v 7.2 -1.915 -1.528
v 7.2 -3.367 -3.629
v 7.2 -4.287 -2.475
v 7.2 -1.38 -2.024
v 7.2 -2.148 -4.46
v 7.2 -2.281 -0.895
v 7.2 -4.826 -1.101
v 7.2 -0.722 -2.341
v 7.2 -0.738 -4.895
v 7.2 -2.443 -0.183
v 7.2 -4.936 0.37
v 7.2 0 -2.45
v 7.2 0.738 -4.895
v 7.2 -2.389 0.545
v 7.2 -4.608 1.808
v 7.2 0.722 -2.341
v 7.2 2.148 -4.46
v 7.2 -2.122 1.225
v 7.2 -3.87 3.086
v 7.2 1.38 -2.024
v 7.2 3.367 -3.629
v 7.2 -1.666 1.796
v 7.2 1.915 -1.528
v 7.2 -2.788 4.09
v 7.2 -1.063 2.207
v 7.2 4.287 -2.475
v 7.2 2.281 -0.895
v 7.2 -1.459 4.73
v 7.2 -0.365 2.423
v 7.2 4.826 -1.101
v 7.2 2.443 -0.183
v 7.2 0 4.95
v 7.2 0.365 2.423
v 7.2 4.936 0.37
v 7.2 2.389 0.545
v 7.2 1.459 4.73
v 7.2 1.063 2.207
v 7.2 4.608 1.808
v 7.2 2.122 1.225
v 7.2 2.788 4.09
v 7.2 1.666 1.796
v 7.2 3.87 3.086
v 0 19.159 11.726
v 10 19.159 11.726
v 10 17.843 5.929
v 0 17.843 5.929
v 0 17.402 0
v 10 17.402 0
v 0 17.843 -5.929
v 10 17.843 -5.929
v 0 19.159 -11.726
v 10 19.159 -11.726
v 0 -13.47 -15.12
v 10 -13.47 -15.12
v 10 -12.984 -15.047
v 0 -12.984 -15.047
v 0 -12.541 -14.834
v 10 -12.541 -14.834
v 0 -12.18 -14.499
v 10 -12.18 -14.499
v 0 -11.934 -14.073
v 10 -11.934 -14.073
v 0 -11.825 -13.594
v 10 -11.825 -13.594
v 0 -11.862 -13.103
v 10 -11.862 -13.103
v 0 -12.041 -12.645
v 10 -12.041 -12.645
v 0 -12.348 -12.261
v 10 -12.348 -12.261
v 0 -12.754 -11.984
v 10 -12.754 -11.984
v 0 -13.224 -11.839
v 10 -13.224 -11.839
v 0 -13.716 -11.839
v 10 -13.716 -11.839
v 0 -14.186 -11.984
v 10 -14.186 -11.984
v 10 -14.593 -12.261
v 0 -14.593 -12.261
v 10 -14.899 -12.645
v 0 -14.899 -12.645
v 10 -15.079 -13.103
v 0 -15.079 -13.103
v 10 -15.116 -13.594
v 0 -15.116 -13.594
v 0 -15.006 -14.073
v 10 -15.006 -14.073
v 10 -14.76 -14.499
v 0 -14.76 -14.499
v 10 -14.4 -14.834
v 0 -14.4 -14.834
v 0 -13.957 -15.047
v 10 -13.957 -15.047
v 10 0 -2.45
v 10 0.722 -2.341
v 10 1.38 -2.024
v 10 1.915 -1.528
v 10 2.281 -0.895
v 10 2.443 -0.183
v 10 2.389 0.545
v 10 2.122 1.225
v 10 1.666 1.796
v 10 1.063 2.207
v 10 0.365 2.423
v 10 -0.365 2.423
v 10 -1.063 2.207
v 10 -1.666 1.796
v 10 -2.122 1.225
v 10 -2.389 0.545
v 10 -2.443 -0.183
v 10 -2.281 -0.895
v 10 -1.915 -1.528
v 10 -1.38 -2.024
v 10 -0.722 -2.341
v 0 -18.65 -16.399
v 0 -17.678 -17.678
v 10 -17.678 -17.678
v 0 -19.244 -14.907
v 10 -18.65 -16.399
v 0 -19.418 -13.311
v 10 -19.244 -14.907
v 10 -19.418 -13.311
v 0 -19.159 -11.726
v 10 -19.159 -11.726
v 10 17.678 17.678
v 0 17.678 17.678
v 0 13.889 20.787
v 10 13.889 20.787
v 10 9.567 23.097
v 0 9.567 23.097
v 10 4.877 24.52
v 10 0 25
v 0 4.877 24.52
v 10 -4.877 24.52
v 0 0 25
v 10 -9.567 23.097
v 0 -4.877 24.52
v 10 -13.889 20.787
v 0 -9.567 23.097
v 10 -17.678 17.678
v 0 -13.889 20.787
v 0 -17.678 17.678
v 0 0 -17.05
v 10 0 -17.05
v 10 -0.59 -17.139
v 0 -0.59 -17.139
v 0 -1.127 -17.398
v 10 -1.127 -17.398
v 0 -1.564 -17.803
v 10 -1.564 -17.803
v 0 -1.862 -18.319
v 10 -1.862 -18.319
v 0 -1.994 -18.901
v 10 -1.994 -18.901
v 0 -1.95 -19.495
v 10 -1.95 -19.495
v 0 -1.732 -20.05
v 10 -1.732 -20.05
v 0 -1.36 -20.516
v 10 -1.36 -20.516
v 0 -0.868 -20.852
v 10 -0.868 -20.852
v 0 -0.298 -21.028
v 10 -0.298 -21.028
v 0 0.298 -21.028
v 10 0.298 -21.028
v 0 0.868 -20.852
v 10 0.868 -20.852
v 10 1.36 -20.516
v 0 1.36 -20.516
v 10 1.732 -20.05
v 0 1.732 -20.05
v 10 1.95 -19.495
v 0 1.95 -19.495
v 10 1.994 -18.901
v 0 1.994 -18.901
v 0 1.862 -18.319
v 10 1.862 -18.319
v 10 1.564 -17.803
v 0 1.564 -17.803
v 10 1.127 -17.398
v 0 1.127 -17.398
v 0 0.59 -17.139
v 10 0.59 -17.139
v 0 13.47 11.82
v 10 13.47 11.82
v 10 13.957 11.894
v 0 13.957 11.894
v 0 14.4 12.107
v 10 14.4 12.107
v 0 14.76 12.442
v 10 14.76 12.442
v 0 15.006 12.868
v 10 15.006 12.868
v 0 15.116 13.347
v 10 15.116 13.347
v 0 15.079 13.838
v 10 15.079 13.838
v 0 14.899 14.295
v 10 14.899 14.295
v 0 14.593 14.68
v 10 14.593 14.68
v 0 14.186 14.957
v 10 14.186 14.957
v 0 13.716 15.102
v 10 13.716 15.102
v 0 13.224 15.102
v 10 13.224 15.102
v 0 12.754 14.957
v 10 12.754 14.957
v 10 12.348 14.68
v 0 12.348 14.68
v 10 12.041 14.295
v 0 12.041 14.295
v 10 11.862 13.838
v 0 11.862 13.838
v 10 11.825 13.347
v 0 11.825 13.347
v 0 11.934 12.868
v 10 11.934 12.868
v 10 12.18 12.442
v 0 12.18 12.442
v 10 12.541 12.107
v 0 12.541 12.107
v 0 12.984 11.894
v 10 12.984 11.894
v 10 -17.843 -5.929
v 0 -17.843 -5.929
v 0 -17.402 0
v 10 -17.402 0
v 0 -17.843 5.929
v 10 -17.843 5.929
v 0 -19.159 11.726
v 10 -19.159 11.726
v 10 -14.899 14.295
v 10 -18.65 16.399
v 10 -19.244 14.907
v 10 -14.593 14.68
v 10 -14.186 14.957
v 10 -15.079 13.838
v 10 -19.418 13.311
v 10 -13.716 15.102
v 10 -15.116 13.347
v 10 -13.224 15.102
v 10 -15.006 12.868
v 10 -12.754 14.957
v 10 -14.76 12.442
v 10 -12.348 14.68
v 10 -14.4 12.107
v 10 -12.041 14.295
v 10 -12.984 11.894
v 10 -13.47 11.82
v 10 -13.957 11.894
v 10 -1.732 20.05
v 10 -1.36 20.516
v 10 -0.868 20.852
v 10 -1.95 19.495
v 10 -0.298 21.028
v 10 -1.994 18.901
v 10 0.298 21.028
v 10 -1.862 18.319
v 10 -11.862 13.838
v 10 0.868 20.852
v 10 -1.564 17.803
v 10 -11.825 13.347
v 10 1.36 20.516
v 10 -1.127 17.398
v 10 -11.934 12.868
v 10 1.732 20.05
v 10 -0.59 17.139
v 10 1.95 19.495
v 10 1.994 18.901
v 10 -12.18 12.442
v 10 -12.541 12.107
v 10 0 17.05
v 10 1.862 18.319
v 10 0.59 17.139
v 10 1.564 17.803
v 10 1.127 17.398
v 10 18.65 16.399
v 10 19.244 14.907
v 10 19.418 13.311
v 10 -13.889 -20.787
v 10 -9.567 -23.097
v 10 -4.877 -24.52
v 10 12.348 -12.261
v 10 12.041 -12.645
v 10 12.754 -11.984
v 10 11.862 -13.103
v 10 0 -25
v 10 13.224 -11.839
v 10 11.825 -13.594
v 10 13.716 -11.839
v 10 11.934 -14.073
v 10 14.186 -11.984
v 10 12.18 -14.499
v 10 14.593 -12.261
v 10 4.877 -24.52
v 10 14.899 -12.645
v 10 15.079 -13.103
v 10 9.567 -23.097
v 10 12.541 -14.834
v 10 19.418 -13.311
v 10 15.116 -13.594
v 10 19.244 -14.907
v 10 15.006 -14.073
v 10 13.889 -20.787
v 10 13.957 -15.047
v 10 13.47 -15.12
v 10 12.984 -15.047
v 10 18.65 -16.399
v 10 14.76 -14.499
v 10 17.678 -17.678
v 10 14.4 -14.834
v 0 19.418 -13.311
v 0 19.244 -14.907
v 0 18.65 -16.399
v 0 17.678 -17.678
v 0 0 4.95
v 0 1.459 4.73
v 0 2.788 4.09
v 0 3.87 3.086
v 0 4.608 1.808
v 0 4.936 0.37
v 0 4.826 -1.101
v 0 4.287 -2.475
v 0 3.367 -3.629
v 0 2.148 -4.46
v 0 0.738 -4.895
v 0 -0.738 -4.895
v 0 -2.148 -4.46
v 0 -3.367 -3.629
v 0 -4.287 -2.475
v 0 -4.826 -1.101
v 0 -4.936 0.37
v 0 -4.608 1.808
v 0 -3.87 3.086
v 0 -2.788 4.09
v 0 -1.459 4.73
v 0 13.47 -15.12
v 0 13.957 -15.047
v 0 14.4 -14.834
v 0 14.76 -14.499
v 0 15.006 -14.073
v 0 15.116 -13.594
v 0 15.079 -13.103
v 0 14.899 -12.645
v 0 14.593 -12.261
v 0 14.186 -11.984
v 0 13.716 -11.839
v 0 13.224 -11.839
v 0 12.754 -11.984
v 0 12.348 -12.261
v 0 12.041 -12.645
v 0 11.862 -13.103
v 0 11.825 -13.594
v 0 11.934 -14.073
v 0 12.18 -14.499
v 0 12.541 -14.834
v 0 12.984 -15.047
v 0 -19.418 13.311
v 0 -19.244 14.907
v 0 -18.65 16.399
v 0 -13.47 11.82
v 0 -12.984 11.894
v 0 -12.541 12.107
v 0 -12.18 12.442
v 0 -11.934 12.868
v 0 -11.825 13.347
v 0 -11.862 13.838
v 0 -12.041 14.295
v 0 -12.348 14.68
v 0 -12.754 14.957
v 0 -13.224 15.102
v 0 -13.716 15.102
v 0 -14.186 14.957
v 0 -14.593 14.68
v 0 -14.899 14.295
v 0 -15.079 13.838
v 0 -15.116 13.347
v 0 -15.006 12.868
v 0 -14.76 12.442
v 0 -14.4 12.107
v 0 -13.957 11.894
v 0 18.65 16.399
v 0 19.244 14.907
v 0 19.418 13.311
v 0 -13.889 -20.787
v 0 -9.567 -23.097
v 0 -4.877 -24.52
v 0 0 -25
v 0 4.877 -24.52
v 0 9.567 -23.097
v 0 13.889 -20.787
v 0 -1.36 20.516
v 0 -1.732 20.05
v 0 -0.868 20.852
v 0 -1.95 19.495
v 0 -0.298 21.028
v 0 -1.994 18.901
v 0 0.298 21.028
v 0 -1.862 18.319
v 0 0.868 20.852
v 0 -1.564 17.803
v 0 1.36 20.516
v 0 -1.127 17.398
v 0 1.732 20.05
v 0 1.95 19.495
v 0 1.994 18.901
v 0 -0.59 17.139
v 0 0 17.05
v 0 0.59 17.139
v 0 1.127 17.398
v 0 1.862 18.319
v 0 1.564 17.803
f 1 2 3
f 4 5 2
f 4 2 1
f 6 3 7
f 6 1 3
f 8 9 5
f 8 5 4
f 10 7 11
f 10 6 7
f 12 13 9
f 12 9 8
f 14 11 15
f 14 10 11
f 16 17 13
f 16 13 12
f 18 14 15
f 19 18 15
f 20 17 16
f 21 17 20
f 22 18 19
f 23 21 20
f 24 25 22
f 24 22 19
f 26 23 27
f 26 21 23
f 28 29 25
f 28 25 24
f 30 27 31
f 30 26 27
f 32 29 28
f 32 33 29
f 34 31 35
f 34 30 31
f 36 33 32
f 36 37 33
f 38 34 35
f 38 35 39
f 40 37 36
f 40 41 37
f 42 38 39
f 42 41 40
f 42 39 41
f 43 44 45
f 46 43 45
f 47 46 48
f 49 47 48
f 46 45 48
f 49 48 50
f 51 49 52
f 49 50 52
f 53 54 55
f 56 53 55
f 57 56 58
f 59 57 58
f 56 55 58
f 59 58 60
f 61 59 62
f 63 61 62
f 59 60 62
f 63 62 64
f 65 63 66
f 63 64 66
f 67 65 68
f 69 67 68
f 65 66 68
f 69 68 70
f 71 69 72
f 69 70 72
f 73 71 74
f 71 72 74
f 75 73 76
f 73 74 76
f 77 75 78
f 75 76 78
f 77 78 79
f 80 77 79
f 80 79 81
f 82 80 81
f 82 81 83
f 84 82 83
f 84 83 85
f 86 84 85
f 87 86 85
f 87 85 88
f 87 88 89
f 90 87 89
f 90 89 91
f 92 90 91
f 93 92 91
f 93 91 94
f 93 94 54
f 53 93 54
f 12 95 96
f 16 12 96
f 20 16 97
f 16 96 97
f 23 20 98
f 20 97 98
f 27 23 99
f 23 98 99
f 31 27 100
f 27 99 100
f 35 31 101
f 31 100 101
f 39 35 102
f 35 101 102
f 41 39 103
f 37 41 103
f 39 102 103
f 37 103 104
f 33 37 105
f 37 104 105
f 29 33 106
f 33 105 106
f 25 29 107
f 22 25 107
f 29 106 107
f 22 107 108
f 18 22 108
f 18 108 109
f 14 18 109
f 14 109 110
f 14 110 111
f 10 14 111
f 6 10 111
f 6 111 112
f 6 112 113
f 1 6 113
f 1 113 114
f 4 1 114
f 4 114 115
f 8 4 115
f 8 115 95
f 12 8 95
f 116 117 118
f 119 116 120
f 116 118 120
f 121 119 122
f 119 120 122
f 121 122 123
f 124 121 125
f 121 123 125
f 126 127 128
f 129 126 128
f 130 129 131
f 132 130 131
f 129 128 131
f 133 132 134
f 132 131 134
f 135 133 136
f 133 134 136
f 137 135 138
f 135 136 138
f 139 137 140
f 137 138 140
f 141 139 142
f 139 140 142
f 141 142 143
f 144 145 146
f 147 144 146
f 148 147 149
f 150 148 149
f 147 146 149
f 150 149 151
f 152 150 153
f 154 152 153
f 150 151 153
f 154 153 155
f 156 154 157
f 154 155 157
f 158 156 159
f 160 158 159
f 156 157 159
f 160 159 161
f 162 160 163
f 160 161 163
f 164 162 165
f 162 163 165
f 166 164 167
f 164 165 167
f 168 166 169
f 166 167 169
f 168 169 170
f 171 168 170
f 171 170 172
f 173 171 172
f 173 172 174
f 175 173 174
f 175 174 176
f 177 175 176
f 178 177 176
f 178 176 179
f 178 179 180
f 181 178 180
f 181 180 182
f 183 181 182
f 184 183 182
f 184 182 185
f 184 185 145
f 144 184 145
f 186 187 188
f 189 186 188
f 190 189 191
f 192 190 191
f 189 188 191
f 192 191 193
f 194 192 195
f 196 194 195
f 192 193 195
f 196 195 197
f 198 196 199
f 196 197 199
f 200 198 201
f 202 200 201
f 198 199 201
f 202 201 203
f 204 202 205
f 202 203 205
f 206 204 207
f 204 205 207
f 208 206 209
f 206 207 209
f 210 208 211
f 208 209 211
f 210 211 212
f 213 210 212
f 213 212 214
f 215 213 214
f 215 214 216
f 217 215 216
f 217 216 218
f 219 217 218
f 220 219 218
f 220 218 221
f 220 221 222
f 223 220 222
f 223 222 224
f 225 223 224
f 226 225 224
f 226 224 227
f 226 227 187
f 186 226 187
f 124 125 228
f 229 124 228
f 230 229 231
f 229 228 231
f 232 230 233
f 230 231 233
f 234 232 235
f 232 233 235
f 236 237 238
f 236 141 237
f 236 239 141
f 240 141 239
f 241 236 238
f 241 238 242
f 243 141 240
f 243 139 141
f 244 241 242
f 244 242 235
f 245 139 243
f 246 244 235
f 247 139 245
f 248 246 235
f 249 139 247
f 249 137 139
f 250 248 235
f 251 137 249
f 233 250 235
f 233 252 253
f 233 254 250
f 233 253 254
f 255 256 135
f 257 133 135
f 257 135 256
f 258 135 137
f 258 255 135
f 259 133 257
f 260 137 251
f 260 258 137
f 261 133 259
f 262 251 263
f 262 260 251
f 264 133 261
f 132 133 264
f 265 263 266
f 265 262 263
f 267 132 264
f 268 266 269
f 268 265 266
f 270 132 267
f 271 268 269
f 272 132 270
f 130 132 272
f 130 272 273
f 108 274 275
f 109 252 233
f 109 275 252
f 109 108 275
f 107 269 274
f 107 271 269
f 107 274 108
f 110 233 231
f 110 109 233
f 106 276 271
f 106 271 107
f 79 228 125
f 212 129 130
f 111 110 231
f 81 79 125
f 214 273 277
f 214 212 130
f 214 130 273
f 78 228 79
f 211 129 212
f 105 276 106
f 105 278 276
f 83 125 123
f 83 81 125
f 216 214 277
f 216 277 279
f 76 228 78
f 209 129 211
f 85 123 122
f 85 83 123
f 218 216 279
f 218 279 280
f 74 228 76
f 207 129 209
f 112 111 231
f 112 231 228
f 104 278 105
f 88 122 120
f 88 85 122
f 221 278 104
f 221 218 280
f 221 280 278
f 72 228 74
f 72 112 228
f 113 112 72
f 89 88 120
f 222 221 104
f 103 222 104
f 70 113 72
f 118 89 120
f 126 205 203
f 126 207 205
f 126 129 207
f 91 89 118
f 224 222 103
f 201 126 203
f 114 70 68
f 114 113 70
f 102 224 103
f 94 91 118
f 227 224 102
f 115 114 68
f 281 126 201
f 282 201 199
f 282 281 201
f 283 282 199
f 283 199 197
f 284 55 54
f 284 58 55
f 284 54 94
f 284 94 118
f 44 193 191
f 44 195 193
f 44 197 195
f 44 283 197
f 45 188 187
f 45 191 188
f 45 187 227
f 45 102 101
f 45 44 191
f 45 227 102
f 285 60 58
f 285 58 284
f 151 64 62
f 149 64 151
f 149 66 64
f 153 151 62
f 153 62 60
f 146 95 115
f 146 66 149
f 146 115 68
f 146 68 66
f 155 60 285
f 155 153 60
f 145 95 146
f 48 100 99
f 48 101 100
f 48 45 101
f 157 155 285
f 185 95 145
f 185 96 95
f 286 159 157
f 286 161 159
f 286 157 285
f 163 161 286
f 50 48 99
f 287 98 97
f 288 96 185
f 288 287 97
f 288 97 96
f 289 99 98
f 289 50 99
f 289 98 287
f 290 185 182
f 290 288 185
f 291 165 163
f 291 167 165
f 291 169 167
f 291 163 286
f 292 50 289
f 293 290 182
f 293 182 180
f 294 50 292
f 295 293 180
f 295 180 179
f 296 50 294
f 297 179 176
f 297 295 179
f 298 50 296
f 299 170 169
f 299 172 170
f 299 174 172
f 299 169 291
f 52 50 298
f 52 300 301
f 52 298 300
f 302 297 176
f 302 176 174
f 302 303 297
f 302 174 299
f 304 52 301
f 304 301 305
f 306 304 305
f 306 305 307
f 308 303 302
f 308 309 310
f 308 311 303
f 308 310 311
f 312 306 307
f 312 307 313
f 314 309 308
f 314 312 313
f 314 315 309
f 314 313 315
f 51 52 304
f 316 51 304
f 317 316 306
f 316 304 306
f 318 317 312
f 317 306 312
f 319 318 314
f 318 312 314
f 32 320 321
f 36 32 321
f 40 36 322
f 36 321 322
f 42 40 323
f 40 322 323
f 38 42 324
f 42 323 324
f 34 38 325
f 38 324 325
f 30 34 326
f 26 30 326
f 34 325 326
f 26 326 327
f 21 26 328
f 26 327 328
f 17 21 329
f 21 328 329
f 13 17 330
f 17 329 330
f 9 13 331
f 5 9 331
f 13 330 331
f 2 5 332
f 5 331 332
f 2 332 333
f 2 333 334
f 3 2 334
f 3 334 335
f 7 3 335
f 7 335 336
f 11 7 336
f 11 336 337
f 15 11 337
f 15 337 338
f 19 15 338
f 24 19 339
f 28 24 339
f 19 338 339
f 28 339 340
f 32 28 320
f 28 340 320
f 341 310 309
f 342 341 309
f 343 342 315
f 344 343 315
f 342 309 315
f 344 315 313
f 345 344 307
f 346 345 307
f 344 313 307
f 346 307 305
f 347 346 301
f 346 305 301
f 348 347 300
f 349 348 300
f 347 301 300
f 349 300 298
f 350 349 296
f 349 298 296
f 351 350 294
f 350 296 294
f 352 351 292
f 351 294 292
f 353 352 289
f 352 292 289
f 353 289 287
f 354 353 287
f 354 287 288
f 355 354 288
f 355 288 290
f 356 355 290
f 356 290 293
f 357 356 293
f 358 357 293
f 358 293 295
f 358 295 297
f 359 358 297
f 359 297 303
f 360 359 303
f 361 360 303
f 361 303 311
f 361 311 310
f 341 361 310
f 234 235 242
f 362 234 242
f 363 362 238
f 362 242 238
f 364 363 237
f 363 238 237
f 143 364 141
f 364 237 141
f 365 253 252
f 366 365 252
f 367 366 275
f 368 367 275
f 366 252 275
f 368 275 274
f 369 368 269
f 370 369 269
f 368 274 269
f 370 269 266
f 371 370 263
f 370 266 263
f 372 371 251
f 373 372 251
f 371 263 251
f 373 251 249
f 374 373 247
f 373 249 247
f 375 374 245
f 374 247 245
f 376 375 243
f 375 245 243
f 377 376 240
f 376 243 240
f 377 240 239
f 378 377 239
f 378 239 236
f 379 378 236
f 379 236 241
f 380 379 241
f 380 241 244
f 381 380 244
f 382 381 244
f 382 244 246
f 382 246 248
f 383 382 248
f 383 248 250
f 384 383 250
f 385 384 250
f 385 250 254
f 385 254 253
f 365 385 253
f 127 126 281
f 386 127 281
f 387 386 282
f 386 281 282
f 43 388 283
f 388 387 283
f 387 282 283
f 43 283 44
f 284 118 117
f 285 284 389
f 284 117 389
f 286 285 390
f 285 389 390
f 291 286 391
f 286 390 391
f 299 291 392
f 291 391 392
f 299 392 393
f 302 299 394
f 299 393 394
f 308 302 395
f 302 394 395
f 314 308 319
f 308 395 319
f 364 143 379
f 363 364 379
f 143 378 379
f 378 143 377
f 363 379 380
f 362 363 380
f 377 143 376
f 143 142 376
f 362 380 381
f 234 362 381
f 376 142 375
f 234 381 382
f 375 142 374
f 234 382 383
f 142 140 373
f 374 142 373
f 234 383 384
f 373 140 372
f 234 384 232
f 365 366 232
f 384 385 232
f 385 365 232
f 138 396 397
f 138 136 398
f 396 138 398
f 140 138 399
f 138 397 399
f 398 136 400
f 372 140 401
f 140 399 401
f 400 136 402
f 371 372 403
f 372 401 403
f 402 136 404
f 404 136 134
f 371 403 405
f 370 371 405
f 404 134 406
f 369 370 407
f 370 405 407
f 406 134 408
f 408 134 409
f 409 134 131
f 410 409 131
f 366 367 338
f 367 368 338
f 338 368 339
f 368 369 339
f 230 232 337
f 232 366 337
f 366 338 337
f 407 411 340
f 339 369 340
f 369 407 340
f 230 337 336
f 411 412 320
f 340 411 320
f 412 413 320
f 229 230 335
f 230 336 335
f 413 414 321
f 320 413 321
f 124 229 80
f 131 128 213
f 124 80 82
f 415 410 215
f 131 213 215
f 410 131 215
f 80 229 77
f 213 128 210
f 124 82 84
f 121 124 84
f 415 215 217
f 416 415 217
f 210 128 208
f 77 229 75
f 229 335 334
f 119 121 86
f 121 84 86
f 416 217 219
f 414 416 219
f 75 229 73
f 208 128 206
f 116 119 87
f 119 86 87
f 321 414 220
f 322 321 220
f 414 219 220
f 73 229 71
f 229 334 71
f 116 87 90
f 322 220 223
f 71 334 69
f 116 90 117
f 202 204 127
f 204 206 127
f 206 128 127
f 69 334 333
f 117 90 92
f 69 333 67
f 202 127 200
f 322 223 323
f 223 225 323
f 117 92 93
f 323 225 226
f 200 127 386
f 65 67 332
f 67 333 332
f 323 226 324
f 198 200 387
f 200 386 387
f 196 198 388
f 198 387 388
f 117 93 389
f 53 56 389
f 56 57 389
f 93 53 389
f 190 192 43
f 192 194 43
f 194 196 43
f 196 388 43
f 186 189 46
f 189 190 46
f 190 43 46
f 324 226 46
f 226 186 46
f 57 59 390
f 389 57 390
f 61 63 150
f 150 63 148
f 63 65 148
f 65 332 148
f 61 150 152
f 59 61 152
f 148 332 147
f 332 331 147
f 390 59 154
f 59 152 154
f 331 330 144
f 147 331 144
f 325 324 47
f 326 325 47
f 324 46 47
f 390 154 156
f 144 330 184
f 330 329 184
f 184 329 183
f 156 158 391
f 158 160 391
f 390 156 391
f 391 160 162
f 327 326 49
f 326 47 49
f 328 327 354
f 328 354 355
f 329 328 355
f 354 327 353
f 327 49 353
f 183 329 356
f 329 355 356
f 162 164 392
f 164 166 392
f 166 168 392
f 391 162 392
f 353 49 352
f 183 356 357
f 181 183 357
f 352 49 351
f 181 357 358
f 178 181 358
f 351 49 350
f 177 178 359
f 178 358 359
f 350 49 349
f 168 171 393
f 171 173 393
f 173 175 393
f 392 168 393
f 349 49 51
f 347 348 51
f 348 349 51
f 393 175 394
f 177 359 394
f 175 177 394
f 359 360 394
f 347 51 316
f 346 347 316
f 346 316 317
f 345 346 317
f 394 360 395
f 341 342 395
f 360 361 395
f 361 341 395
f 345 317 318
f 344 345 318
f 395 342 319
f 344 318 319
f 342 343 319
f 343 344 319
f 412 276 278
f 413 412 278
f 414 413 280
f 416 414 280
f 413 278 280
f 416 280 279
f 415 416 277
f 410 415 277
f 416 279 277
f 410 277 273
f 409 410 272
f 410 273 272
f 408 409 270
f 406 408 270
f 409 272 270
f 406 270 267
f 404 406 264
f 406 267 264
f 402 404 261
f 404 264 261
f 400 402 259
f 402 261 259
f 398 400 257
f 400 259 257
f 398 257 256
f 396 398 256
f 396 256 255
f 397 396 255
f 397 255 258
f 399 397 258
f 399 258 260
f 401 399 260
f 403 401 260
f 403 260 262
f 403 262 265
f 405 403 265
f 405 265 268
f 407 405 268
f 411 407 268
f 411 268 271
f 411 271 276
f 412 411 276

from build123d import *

# Parameters (mm, degrees)
SKETCH_1_R          = 25
EXTRUDE_1_DEPTH     = 10
SKETCH_3_R          = 2.45
CUT_EXTRUDE_1_DEPTH = 37.742346142
SKETCH_5_R          = 4.95
CUT_EXTRUDE_2_DEPTH = 7.2
SKETCH_6_R          = 2
CUT_EXTRUDE_3_DEPTH = 37.742346142
SKETCH_7_R          = 1.65
CUT_EXTRUDE_4_DEPTH = 37.742346142
CUT_EXTRUDE_5_DEPTH = 37.742346142


with BuildPart() as part:
    # ｽｹｯﾁ1 → ﾎﾞｽ - 押し出し1 (new body)
    with BuildSketch(Plane(origin=(0, 0, 0), x_dir=(0, 0, -1), z_dir=(1, 0, 0))):
        Circle(SKETCH_1_R)
    extrude(amount=EXTRUDE_1_DEPTH)

    # ｽｹｯﾁ3 → ｶｯﾄ - 押し出し1 (cut, through all)
    with BuildSketch(Plane(origin=(10, 0, 0), x_dir=(0, 0, -1), z_dir=(1, 0, 0))):
        Circle(SKETCH_3_R)
    extrude(amount=-CUT_EXTRUDE_1_DEPTH, mode=Mode.SUBTRACT)

    # ｽｹｯﾁ5 → ｶｯﾄ - 押し出し2 (cut)
    with BuildSketch(Plane.ZY):
        Circle(SKETCH_5_R)
    extrude(amount=-CUT_EXTRUDE_2_DEPTH, mode=Mode.SUBTRACT)

    # ｽｹｯﾁ6 → ｶｯﾄ - 押し出し3 (cut, through all)
    with BuildSketch(Plane(origin=(10, 0, 0), x_dir=(0, 0, -1), z_dir=(1, 0, 0))):
        with Locations((-19.05, 0)):
            Circle(SKETCH_6_R)
        with Locations(Location((19.05, 0, 0), (0, 0, 180))):
            Circle(SKETCH_6_R)
    extrude(amount=-CUT_EXTRUDE_3_DEPTH, mode=Mode.SUBTRACT)

    # ｽｹｯﾁ7 → ｶｯﾄ - 押し出し4 (cut, through all)
    with BuildSketch(Plane(origin=(10, 0, 0), x_dir=(0, 0, -1), z_dir=(1, 0, 0))):
        with Locations((13.470384182, 13.470384182)):
            Circle(SKETCH_7_R)
        with Locations((13.470384182, -13.470384182)):
            Circle(SKETCH_7_R)
        with Locations((-13.470384182, -13.470384182)):
            Circle(SKETCH_7_R)
        with Locations((-13.470384182, 13.470384182)):
            Circle(SKETCH_7_R)
    extrude(amount=-CUT_EXTRUDE_4_DEPTH, mode=Mode.SUBTRACT)

    # ｽｹｯﾁ8 → ｶｯﾄ - 押し出し5 (cut, through all)
    with BuildSketch(Plane(origin=(10, 0, 0), x_dir=(0, 0, -1), z_dir=(1, 0, 0))):
        with BuildLine():
            ThreePointArc((-17.67766953, 17.67766953), (-14.907460792, 19.244231323), (-11.726124041, 19.158974214))
            ThreePointArc((-11.726124041, 19.158974214), (-3.5e-08, 17.401594613), (11.726123974, 19.158974194))
            ThreePointArc((11.726123974, 19.158974194), (14.907460759, 19.244231332), (17.67766953, 17.67766953))
            ThreePointArc((17.67766953, 17.67766953), (0, 25), (-17.67766953, 17.67766953))
        make_face()
        with BuildLine():
            ThreePointArc((-11.726124073, -19.158974224), (-14.90746082, -19.244231316), (-17.677669546, -17.677669513))
            ThreePointArc((-17.677669546, -17.677669513), (-4.3e-08, -25), (17.677669486, -17.677669573))
            ThreePointArc((17.677669486, -17.677669573), (14.9074607, -19.244231346), (11.726123917, -19.158974177))
            ThreePointArc((11.726123917, -19.158974177), (-8.1e-08, -17.401594613), (-11.726124073, -19.158974224))
        make_face()
    extrude(amount=-CUT_EXTRUDE_5_DEPTH, mode=Mode.SUBTRACT)


solid = part.part
